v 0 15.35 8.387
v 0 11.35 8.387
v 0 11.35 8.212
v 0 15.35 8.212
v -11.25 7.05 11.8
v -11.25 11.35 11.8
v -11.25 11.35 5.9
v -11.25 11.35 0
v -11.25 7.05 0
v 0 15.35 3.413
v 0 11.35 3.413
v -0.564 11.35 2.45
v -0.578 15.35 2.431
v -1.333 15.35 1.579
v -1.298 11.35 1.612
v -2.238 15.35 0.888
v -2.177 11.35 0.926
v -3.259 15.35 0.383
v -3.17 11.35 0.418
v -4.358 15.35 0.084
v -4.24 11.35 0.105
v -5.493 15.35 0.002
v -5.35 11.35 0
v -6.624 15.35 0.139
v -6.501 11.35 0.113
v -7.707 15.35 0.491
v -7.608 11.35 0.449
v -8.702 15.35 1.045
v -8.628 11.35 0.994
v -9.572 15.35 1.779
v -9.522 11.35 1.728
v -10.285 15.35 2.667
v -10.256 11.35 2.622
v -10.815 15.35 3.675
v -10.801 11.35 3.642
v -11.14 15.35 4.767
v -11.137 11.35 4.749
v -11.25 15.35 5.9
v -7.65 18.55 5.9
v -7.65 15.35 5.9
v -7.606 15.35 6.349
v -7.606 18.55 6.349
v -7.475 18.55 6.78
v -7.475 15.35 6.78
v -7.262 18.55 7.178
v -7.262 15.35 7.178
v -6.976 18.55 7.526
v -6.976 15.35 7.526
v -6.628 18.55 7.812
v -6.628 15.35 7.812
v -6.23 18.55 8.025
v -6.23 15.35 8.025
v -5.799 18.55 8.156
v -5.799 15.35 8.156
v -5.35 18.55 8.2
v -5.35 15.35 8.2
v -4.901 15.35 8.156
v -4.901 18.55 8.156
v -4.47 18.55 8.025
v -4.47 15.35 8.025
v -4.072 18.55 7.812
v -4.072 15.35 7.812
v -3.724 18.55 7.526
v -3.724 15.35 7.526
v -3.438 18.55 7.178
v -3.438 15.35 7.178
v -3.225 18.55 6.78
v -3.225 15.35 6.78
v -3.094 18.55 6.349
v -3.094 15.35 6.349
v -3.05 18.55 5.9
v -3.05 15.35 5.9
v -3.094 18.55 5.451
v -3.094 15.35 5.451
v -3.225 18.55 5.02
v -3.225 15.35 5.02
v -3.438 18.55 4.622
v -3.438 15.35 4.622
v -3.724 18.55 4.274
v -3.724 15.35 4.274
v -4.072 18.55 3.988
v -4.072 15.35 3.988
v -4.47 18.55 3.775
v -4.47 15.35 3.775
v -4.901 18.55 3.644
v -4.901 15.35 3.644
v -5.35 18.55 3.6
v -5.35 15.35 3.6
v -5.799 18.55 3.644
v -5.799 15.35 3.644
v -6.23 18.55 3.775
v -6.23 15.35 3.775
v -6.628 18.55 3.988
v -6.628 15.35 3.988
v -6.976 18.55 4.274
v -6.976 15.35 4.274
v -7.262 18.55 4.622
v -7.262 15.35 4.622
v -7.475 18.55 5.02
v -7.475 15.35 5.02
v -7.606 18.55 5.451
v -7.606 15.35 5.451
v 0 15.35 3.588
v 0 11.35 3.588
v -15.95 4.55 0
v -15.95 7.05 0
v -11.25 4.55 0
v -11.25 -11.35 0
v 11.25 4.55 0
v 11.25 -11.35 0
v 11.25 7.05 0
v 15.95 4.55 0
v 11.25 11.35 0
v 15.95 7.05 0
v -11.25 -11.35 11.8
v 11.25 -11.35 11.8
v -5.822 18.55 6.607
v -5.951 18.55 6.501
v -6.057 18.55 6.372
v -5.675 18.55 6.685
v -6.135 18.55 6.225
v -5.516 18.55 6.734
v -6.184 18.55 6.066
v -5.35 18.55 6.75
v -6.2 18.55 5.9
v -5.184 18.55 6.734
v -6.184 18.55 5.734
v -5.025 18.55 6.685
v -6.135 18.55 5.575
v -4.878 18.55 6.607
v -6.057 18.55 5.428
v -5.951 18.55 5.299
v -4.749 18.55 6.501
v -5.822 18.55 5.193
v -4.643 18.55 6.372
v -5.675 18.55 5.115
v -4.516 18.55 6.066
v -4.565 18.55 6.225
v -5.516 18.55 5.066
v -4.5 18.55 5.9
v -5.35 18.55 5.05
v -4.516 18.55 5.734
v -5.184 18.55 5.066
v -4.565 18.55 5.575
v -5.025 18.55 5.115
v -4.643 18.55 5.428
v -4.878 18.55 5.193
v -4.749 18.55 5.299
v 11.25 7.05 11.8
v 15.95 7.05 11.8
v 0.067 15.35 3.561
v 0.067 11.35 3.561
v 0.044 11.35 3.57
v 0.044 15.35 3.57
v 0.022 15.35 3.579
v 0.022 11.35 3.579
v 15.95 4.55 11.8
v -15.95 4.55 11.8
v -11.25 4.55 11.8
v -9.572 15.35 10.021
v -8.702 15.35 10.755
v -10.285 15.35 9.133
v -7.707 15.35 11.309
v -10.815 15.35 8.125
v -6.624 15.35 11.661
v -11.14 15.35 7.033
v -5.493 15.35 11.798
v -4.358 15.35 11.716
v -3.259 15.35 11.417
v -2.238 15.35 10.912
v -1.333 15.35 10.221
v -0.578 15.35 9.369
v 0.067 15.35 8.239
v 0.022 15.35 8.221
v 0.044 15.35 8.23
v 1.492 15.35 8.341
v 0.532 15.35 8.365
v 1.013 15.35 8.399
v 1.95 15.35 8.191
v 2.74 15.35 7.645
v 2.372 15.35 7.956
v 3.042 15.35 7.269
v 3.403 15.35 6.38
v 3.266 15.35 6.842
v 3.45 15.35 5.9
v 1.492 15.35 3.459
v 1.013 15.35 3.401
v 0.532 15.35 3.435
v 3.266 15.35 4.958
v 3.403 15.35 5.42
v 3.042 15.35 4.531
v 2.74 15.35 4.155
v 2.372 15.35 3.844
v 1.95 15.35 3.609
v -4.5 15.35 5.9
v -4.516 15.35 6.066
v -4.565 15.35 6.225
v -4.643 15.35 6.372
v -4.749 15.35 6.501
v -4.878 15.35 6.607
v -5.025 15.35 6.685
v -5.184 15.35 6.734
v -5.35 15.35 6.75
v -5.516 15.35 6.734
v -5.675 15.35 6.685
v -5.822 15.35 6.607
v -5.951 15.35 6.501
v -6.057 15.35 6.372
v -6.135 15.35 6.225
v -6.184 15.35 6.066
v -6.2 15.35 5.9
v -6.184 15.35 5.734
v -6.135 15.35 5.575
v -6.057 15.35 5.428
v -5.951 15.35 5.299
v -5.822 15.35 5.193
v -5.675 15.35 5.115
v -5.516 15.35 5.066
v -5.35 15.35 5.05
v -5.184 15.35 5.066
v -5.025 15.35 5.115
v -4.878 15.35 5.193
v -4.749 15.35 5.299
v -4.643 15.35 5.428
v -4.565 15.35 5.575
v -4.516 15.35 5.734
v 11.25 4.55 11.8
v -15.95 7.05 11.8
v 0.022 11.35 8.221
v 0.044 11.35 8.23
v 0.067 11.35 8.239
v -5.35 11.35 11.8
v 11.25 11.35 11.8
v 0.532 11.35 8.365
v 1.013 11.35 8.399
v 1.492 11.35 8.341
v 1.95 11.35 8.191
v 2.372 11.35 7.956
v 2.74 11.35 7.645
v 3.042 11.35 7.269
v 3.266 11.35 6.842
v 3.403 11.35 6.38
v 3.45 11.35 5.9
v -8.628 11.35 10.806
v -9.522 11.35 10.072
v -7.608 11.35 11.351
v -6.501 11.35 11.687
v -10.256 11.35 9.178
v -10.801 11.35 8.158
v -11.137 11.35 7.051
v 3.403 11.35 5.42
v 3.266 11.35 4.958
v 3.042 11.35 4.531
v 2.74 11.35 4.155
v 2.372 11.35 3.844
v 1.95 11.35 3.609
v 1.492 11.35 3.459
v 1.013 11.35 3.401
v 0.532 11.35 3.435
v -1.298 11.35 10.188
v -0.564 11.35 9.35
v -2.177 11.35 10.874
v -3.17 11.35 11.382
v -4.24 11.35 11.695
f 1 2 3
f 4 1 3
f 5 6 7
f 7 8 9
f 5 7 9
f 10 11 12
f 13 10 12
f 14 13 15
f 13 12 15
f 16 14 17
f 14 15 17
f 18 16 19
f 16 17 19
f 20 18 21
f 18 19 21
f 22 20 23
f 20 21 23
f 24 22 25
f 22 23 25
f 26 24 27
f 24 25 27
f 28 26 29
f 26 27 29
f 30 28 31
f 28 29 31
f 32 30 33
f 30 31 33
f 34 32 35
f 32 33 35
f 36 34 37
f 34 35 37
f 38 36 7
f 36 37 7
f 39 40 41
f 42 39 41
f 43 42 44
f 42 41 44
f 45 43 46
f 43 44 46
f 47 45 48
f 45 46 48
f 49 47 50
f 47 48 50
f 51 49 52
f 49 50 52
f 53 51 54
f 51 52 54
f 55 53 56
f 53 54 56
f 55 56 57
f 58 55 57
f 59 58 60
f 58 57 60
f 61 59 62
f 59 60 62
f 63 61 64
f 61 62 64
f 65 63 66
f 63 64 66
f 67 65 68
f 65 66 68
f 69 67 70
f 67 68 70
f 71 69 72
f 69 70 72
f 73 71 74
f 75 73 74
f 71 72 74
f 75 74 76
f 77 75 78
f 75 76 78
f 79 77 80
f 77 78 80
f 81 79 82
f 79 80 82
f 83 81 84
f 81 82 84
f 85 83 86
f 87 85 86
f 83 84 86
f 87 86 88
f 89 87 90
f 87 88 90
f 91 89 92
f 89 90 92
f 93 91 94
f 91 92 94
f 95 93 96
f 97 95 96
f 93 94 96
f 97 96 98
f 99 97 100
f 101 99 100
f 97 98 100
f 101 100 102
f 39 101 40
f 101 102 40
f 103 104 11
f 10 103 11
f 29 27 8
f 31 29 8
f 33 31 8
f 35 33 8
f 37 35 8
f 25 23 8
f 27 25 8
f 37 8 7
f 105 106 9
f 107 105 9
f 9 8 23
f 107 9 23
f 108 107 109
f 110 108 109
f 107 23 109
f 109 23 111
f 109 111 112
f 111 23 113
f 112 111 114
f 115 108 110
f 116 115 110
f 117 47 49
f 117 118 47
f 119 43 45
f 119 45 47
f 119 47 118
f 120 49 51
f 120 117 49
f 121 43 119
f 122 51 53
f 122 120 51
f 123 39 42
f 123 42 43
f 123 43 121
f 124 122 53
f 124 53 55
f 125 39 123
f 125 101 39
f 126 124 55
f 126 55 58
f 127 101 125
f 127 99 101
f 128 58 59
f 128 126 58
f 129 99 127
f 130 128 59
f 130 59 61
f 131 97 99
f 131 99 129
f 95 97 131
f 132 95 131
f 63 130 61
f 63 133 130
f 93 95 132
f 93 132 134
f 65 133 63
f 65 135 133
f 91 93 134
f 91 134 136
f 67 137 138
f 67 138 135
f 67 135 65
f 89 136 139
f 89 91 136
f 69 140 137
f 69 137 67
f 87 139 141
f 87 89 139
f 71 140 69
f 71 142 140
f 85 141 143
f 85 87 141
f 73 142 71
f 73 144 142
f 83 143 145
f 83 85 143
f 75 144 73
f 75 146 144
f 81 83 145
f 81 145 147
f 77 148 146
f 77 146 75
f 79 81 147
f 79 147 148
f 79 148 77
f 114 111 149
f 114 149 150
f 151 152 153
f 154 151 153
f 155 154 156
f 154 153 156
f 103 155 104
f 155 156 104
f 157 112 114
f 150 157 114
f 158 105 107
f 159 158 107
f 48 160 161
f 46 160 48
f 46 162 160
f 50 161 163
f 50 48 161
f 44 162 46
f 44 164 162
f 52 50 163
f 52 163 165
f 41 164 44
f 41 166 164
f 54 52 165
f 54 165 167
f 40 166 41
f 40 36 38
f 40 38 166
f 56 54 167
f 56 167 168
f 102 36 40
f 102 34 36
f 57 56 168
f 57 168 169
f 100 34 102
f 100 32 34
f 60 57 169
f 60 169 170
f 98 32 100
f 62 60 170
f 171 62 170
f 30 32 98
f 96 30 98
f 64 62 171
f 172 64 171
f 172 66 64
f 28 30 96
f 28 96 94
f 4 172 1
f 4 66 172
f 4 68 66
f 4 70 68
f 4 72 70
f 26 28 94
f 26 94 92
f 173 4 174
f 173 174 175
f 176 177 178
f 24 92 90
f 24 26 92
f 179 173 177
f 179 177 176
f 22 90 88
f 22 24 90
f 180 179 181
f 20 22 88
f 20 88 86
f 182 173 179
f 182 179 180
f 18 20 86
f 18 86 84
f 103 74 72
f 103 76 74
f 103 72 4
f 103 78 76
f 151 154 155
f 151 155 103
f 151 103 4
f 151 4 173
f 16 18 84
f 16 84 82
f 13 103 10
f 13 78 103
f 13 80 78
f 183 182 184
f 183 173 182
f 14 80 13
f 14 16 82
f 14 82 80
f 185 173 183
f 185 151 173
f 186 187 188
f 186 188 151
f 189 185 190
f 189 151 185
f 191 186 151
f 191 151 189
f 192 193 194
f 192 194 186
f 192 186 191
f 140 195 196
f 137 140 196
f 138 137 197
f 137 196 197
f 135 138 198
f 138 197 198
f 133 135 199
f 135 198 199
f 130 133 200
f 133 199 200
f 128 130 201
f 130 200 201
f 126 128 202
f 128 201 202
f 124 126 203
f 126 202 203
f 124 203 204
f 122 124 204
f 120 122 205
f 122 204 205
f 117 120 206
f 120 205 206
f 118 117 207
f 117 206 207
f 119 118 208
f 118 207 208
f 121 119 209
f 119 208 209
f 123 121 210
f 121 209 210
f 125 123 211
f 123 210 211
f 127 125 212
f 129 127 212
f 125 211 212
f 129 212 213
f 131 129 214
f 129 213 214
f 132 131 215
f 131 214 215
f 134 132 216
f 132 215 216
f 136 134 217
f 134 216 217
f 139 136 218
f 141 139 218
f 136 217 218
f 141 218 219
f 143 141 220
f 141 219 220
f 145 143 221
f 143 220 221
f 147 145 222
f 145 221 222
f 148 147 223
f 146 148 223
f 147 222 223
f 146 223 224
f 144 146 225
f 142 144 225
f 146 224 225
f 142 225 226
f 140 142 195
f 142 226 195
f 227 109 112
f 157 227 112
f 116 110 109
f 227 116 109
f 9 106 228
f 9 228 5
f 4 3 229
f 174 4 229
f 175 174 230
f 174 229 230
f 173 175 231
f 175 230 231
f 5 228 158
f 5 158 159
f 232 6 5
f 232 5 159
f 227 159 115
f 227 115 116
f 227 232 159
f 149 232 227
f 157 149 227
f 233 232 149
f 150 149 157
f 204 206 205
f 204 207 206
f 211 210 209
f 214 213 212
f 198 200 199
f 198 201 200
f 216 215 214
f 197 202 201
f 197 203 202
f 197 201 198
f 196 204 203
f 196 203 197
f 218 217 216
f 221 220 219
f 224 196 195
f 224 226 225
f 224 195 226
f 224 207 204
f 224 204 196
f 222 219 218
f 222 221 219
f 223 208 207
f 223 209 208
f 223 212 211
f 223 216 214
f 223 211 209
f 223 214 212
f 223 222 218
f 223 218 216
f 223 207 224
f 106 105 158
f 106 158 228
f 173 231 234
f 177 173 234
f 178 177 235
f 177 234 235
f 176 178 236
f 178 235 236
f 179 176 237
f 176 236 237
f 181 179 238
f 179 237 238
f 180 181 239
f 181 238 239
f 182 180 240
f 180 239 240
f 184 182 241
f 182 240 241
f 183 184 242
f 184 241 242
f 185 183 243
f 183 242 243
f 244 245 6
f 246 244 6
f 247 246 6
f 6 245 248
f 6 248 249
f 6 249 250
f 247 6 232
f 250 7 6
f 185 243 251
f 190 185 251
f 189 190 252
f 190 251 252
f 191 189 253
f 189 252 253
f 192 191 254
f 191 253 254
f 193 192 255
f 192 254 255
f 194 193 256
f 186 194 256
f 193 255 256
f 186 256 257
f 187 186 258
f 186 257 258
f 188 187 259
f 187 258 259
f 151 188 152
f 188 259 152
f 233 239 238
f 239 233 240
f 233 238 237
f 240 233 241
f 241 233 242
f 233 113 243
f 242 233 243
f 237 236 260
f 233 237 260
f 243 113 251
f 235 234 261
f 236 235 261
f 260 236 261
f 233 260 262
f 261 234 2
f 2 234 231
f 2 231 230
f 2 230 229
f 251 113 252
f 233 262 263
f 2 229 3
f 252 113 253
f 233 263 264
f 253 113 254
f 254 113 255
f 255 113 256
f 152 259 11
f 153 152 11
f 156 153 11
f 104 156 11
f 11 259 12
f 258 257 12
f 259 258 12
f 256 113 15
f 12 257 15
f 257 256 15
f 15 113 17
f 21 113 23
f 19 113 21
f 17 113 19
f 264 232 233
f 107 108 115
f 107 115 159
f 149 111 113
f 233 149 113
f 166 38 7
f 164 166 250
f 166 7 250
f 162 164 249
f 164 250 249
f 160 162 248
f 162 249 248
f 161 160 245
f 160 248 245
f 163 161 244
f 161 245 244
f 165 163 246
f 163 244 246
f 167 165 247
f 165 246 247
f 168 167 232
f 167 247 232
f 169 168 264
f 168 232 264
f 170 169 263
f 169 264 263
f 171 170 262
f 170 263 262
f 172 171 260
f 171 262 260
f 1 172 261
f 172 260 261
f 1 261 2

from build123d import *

# Parameters (mm, degrees)
CROQUIS1_W              = 4.7
CROQUIS1_H              = 2.5
CROQUIS1_W_2            = 22.5
CROQUIS1_H_2            = 15.9
SALIENTE_EXTRUIR1_DEPTH = 11.8
SALIENTE_EXTRUIR2_DEPTH = 4
SALIENTE_EXTRUIR3_DEPTH = 3.2


with BuildPart() as part:
    # Croquis1 → Saliente-Extruir1 (new body)
    with BuildSketch(Plane.XY):
        with Locations((-13.6, 5.8)):
            Rectangle(CROQUIS1_W, CROQUIS1_H)
        Polygon((-11.25, 7.05), (-11.25, 4.55), (11.25, 4.55), (11.25, 7.05), (11.25, 11.35), (-11.25, 11.35), align=None)
        with Locations((0, -3.4)):
            Rectangle(CROQUIS1_W_2, CROQUIS1_H_2)
        with Locations((13.6, 5.8)):
            Rectangle(CROQUIS1_W, CROQUIS1_H)
    extrude(amount=SALIENTE_EXTRUIR1_DEPTH)

    # Croquis3 → Saliente-Extruir2 (add)
    with BuildSketch(Plane(origin=(0, 11.35, 0), x_dir=(1, 0, 0), z_dir=(0, 1, 0))):
        with BuildLine():
            ThreePointArc((0.066666667, -3.561256273), (0.427903311, -4.705917367), (0.55, -5.9))
            Line((0.55, -5.9), (3.45, -5.9))
            ThreePointArc((3.45, -5.9), (2.371560176, -3.84350622), (0.066666667, -3.561256273))
        make_face()
        with BuildLine():
            Line((3.45, -5.9), (0.55, -5.9))
            ThreePointArc((0.55, -5.9), (0.427903311, -7.094082633), (0.066666667, -8.238743727))
            ThreePointArc((0.066666667, -8.238743727), (2.371560176, -7.95649378), (3.45, -5.9))
        make_face()
        with BuildLine():
            Line((0, -8.212466216), (0, -5.9))
            Line((0, -5.9), (-1.55, -5.9))
            ThreePointArc((-1.55, -5.9), (-1.126655966, -7.291941091), (0, -8.212466216))
        make_face()
        with BuildLine():
            Line((-1.55, -5.9), (0, -5.9))
            Line((0, -5.9), (0, -3.587533784))
            ThreePointArc((0, -3.587533784), (-1.126655966, -4.508058909), (-1.55, -5.9))
        make_face()
        with BuildLine():
            ThreePointArc((0.066666667, -8.238743727), (0.427903311, -7.094082633), (0.55, -5.9))
            Line((0.55, -5.9), (0, -5.9))
            Line((0, -5.9), (0, -8.212466216))
            ThreePointArc((0, -8.212466216), (0.033239178, -8.225843846), (0.066666667, -8.238743727))
        make_face()
        with BuildLine():
            Line((0, -5.9), (0.55, -5.9))
            ThreePointArc((0.55, -5.9), (0.427903311, -4.705917367), (0.066666667, -3.561256273))
            ThreePointArc((0.066666667, -3.561256273), (0.033239178, -3.574156154), (0, -3.587533784))
            Line((0, -3.587533784), (0, -5.9))
        make_face()
        with BuildLine():
            ThreePointArc((0, -8.212466216), (-1.126655966, -7.291941091), (-1.55, -5.9))
            Line((-1.55, -5.9), (-11.25, -5.9))
            ThreePointArc((-11.25, -5.9), (-6.62377392, -11.660859311), (0, -8.387468593))
            Line((0, -8.387468593), (0, -8.212466216))
        make_face()
        with BuildLine():
            Line((-11.25, -5.9), (-1.55, -5.9))
            ThreePointArc((-1.55, -5.9), (-1.126655966, -4.508058909), (0, -3.587533784))
            Line((0, -3.587533784), (0, -3.412531407))
            ThreePointArc((0, -3.412531407), (-6.62377392, -0.139140689), (-11.25, -5.9))
        make_face()
    extrude(amount=SALIENTE_EXTRUIR2_DEPTH)

    # Croquis4 → Saliente-Extruir3 (add)
    with BuildSketch(Plane(origin=(0, 15.35, 0), x_dir=(1, 0, 0), z_dir=(0, 1, 0))):
        with BuildLine():
            ThreePointArc((-6.2, -5.9), (-5.35, -5.05), (-4.5, -5.9))
            Line((-4.5, -5.9), (-3.05, -5.9))
            ThreePointArc((-3.05, -5.9), (-5.35, -3.6), (-7.65, -5.9))
            Line((-7.65, -5.9), (-6.2, -5.9))
        make_face()
        with BuildLine():
            Line((-3.05, -5.9), (-4.5, -5.9))
            ThreePointArc((-4.5, -5.9), (-5.35, -6.75), (-6.2, -5.9))
            Line((-6.2, -5.9), (-7.65, -5.9))
            ThreePointArc((-7.65, -5.9), (-5.35, -8.2), (-3.05, -5.9))
        make_face()
    extrude(amount=SALIENTE_EXTRUIR3_DEPTH)


solid = part.part
